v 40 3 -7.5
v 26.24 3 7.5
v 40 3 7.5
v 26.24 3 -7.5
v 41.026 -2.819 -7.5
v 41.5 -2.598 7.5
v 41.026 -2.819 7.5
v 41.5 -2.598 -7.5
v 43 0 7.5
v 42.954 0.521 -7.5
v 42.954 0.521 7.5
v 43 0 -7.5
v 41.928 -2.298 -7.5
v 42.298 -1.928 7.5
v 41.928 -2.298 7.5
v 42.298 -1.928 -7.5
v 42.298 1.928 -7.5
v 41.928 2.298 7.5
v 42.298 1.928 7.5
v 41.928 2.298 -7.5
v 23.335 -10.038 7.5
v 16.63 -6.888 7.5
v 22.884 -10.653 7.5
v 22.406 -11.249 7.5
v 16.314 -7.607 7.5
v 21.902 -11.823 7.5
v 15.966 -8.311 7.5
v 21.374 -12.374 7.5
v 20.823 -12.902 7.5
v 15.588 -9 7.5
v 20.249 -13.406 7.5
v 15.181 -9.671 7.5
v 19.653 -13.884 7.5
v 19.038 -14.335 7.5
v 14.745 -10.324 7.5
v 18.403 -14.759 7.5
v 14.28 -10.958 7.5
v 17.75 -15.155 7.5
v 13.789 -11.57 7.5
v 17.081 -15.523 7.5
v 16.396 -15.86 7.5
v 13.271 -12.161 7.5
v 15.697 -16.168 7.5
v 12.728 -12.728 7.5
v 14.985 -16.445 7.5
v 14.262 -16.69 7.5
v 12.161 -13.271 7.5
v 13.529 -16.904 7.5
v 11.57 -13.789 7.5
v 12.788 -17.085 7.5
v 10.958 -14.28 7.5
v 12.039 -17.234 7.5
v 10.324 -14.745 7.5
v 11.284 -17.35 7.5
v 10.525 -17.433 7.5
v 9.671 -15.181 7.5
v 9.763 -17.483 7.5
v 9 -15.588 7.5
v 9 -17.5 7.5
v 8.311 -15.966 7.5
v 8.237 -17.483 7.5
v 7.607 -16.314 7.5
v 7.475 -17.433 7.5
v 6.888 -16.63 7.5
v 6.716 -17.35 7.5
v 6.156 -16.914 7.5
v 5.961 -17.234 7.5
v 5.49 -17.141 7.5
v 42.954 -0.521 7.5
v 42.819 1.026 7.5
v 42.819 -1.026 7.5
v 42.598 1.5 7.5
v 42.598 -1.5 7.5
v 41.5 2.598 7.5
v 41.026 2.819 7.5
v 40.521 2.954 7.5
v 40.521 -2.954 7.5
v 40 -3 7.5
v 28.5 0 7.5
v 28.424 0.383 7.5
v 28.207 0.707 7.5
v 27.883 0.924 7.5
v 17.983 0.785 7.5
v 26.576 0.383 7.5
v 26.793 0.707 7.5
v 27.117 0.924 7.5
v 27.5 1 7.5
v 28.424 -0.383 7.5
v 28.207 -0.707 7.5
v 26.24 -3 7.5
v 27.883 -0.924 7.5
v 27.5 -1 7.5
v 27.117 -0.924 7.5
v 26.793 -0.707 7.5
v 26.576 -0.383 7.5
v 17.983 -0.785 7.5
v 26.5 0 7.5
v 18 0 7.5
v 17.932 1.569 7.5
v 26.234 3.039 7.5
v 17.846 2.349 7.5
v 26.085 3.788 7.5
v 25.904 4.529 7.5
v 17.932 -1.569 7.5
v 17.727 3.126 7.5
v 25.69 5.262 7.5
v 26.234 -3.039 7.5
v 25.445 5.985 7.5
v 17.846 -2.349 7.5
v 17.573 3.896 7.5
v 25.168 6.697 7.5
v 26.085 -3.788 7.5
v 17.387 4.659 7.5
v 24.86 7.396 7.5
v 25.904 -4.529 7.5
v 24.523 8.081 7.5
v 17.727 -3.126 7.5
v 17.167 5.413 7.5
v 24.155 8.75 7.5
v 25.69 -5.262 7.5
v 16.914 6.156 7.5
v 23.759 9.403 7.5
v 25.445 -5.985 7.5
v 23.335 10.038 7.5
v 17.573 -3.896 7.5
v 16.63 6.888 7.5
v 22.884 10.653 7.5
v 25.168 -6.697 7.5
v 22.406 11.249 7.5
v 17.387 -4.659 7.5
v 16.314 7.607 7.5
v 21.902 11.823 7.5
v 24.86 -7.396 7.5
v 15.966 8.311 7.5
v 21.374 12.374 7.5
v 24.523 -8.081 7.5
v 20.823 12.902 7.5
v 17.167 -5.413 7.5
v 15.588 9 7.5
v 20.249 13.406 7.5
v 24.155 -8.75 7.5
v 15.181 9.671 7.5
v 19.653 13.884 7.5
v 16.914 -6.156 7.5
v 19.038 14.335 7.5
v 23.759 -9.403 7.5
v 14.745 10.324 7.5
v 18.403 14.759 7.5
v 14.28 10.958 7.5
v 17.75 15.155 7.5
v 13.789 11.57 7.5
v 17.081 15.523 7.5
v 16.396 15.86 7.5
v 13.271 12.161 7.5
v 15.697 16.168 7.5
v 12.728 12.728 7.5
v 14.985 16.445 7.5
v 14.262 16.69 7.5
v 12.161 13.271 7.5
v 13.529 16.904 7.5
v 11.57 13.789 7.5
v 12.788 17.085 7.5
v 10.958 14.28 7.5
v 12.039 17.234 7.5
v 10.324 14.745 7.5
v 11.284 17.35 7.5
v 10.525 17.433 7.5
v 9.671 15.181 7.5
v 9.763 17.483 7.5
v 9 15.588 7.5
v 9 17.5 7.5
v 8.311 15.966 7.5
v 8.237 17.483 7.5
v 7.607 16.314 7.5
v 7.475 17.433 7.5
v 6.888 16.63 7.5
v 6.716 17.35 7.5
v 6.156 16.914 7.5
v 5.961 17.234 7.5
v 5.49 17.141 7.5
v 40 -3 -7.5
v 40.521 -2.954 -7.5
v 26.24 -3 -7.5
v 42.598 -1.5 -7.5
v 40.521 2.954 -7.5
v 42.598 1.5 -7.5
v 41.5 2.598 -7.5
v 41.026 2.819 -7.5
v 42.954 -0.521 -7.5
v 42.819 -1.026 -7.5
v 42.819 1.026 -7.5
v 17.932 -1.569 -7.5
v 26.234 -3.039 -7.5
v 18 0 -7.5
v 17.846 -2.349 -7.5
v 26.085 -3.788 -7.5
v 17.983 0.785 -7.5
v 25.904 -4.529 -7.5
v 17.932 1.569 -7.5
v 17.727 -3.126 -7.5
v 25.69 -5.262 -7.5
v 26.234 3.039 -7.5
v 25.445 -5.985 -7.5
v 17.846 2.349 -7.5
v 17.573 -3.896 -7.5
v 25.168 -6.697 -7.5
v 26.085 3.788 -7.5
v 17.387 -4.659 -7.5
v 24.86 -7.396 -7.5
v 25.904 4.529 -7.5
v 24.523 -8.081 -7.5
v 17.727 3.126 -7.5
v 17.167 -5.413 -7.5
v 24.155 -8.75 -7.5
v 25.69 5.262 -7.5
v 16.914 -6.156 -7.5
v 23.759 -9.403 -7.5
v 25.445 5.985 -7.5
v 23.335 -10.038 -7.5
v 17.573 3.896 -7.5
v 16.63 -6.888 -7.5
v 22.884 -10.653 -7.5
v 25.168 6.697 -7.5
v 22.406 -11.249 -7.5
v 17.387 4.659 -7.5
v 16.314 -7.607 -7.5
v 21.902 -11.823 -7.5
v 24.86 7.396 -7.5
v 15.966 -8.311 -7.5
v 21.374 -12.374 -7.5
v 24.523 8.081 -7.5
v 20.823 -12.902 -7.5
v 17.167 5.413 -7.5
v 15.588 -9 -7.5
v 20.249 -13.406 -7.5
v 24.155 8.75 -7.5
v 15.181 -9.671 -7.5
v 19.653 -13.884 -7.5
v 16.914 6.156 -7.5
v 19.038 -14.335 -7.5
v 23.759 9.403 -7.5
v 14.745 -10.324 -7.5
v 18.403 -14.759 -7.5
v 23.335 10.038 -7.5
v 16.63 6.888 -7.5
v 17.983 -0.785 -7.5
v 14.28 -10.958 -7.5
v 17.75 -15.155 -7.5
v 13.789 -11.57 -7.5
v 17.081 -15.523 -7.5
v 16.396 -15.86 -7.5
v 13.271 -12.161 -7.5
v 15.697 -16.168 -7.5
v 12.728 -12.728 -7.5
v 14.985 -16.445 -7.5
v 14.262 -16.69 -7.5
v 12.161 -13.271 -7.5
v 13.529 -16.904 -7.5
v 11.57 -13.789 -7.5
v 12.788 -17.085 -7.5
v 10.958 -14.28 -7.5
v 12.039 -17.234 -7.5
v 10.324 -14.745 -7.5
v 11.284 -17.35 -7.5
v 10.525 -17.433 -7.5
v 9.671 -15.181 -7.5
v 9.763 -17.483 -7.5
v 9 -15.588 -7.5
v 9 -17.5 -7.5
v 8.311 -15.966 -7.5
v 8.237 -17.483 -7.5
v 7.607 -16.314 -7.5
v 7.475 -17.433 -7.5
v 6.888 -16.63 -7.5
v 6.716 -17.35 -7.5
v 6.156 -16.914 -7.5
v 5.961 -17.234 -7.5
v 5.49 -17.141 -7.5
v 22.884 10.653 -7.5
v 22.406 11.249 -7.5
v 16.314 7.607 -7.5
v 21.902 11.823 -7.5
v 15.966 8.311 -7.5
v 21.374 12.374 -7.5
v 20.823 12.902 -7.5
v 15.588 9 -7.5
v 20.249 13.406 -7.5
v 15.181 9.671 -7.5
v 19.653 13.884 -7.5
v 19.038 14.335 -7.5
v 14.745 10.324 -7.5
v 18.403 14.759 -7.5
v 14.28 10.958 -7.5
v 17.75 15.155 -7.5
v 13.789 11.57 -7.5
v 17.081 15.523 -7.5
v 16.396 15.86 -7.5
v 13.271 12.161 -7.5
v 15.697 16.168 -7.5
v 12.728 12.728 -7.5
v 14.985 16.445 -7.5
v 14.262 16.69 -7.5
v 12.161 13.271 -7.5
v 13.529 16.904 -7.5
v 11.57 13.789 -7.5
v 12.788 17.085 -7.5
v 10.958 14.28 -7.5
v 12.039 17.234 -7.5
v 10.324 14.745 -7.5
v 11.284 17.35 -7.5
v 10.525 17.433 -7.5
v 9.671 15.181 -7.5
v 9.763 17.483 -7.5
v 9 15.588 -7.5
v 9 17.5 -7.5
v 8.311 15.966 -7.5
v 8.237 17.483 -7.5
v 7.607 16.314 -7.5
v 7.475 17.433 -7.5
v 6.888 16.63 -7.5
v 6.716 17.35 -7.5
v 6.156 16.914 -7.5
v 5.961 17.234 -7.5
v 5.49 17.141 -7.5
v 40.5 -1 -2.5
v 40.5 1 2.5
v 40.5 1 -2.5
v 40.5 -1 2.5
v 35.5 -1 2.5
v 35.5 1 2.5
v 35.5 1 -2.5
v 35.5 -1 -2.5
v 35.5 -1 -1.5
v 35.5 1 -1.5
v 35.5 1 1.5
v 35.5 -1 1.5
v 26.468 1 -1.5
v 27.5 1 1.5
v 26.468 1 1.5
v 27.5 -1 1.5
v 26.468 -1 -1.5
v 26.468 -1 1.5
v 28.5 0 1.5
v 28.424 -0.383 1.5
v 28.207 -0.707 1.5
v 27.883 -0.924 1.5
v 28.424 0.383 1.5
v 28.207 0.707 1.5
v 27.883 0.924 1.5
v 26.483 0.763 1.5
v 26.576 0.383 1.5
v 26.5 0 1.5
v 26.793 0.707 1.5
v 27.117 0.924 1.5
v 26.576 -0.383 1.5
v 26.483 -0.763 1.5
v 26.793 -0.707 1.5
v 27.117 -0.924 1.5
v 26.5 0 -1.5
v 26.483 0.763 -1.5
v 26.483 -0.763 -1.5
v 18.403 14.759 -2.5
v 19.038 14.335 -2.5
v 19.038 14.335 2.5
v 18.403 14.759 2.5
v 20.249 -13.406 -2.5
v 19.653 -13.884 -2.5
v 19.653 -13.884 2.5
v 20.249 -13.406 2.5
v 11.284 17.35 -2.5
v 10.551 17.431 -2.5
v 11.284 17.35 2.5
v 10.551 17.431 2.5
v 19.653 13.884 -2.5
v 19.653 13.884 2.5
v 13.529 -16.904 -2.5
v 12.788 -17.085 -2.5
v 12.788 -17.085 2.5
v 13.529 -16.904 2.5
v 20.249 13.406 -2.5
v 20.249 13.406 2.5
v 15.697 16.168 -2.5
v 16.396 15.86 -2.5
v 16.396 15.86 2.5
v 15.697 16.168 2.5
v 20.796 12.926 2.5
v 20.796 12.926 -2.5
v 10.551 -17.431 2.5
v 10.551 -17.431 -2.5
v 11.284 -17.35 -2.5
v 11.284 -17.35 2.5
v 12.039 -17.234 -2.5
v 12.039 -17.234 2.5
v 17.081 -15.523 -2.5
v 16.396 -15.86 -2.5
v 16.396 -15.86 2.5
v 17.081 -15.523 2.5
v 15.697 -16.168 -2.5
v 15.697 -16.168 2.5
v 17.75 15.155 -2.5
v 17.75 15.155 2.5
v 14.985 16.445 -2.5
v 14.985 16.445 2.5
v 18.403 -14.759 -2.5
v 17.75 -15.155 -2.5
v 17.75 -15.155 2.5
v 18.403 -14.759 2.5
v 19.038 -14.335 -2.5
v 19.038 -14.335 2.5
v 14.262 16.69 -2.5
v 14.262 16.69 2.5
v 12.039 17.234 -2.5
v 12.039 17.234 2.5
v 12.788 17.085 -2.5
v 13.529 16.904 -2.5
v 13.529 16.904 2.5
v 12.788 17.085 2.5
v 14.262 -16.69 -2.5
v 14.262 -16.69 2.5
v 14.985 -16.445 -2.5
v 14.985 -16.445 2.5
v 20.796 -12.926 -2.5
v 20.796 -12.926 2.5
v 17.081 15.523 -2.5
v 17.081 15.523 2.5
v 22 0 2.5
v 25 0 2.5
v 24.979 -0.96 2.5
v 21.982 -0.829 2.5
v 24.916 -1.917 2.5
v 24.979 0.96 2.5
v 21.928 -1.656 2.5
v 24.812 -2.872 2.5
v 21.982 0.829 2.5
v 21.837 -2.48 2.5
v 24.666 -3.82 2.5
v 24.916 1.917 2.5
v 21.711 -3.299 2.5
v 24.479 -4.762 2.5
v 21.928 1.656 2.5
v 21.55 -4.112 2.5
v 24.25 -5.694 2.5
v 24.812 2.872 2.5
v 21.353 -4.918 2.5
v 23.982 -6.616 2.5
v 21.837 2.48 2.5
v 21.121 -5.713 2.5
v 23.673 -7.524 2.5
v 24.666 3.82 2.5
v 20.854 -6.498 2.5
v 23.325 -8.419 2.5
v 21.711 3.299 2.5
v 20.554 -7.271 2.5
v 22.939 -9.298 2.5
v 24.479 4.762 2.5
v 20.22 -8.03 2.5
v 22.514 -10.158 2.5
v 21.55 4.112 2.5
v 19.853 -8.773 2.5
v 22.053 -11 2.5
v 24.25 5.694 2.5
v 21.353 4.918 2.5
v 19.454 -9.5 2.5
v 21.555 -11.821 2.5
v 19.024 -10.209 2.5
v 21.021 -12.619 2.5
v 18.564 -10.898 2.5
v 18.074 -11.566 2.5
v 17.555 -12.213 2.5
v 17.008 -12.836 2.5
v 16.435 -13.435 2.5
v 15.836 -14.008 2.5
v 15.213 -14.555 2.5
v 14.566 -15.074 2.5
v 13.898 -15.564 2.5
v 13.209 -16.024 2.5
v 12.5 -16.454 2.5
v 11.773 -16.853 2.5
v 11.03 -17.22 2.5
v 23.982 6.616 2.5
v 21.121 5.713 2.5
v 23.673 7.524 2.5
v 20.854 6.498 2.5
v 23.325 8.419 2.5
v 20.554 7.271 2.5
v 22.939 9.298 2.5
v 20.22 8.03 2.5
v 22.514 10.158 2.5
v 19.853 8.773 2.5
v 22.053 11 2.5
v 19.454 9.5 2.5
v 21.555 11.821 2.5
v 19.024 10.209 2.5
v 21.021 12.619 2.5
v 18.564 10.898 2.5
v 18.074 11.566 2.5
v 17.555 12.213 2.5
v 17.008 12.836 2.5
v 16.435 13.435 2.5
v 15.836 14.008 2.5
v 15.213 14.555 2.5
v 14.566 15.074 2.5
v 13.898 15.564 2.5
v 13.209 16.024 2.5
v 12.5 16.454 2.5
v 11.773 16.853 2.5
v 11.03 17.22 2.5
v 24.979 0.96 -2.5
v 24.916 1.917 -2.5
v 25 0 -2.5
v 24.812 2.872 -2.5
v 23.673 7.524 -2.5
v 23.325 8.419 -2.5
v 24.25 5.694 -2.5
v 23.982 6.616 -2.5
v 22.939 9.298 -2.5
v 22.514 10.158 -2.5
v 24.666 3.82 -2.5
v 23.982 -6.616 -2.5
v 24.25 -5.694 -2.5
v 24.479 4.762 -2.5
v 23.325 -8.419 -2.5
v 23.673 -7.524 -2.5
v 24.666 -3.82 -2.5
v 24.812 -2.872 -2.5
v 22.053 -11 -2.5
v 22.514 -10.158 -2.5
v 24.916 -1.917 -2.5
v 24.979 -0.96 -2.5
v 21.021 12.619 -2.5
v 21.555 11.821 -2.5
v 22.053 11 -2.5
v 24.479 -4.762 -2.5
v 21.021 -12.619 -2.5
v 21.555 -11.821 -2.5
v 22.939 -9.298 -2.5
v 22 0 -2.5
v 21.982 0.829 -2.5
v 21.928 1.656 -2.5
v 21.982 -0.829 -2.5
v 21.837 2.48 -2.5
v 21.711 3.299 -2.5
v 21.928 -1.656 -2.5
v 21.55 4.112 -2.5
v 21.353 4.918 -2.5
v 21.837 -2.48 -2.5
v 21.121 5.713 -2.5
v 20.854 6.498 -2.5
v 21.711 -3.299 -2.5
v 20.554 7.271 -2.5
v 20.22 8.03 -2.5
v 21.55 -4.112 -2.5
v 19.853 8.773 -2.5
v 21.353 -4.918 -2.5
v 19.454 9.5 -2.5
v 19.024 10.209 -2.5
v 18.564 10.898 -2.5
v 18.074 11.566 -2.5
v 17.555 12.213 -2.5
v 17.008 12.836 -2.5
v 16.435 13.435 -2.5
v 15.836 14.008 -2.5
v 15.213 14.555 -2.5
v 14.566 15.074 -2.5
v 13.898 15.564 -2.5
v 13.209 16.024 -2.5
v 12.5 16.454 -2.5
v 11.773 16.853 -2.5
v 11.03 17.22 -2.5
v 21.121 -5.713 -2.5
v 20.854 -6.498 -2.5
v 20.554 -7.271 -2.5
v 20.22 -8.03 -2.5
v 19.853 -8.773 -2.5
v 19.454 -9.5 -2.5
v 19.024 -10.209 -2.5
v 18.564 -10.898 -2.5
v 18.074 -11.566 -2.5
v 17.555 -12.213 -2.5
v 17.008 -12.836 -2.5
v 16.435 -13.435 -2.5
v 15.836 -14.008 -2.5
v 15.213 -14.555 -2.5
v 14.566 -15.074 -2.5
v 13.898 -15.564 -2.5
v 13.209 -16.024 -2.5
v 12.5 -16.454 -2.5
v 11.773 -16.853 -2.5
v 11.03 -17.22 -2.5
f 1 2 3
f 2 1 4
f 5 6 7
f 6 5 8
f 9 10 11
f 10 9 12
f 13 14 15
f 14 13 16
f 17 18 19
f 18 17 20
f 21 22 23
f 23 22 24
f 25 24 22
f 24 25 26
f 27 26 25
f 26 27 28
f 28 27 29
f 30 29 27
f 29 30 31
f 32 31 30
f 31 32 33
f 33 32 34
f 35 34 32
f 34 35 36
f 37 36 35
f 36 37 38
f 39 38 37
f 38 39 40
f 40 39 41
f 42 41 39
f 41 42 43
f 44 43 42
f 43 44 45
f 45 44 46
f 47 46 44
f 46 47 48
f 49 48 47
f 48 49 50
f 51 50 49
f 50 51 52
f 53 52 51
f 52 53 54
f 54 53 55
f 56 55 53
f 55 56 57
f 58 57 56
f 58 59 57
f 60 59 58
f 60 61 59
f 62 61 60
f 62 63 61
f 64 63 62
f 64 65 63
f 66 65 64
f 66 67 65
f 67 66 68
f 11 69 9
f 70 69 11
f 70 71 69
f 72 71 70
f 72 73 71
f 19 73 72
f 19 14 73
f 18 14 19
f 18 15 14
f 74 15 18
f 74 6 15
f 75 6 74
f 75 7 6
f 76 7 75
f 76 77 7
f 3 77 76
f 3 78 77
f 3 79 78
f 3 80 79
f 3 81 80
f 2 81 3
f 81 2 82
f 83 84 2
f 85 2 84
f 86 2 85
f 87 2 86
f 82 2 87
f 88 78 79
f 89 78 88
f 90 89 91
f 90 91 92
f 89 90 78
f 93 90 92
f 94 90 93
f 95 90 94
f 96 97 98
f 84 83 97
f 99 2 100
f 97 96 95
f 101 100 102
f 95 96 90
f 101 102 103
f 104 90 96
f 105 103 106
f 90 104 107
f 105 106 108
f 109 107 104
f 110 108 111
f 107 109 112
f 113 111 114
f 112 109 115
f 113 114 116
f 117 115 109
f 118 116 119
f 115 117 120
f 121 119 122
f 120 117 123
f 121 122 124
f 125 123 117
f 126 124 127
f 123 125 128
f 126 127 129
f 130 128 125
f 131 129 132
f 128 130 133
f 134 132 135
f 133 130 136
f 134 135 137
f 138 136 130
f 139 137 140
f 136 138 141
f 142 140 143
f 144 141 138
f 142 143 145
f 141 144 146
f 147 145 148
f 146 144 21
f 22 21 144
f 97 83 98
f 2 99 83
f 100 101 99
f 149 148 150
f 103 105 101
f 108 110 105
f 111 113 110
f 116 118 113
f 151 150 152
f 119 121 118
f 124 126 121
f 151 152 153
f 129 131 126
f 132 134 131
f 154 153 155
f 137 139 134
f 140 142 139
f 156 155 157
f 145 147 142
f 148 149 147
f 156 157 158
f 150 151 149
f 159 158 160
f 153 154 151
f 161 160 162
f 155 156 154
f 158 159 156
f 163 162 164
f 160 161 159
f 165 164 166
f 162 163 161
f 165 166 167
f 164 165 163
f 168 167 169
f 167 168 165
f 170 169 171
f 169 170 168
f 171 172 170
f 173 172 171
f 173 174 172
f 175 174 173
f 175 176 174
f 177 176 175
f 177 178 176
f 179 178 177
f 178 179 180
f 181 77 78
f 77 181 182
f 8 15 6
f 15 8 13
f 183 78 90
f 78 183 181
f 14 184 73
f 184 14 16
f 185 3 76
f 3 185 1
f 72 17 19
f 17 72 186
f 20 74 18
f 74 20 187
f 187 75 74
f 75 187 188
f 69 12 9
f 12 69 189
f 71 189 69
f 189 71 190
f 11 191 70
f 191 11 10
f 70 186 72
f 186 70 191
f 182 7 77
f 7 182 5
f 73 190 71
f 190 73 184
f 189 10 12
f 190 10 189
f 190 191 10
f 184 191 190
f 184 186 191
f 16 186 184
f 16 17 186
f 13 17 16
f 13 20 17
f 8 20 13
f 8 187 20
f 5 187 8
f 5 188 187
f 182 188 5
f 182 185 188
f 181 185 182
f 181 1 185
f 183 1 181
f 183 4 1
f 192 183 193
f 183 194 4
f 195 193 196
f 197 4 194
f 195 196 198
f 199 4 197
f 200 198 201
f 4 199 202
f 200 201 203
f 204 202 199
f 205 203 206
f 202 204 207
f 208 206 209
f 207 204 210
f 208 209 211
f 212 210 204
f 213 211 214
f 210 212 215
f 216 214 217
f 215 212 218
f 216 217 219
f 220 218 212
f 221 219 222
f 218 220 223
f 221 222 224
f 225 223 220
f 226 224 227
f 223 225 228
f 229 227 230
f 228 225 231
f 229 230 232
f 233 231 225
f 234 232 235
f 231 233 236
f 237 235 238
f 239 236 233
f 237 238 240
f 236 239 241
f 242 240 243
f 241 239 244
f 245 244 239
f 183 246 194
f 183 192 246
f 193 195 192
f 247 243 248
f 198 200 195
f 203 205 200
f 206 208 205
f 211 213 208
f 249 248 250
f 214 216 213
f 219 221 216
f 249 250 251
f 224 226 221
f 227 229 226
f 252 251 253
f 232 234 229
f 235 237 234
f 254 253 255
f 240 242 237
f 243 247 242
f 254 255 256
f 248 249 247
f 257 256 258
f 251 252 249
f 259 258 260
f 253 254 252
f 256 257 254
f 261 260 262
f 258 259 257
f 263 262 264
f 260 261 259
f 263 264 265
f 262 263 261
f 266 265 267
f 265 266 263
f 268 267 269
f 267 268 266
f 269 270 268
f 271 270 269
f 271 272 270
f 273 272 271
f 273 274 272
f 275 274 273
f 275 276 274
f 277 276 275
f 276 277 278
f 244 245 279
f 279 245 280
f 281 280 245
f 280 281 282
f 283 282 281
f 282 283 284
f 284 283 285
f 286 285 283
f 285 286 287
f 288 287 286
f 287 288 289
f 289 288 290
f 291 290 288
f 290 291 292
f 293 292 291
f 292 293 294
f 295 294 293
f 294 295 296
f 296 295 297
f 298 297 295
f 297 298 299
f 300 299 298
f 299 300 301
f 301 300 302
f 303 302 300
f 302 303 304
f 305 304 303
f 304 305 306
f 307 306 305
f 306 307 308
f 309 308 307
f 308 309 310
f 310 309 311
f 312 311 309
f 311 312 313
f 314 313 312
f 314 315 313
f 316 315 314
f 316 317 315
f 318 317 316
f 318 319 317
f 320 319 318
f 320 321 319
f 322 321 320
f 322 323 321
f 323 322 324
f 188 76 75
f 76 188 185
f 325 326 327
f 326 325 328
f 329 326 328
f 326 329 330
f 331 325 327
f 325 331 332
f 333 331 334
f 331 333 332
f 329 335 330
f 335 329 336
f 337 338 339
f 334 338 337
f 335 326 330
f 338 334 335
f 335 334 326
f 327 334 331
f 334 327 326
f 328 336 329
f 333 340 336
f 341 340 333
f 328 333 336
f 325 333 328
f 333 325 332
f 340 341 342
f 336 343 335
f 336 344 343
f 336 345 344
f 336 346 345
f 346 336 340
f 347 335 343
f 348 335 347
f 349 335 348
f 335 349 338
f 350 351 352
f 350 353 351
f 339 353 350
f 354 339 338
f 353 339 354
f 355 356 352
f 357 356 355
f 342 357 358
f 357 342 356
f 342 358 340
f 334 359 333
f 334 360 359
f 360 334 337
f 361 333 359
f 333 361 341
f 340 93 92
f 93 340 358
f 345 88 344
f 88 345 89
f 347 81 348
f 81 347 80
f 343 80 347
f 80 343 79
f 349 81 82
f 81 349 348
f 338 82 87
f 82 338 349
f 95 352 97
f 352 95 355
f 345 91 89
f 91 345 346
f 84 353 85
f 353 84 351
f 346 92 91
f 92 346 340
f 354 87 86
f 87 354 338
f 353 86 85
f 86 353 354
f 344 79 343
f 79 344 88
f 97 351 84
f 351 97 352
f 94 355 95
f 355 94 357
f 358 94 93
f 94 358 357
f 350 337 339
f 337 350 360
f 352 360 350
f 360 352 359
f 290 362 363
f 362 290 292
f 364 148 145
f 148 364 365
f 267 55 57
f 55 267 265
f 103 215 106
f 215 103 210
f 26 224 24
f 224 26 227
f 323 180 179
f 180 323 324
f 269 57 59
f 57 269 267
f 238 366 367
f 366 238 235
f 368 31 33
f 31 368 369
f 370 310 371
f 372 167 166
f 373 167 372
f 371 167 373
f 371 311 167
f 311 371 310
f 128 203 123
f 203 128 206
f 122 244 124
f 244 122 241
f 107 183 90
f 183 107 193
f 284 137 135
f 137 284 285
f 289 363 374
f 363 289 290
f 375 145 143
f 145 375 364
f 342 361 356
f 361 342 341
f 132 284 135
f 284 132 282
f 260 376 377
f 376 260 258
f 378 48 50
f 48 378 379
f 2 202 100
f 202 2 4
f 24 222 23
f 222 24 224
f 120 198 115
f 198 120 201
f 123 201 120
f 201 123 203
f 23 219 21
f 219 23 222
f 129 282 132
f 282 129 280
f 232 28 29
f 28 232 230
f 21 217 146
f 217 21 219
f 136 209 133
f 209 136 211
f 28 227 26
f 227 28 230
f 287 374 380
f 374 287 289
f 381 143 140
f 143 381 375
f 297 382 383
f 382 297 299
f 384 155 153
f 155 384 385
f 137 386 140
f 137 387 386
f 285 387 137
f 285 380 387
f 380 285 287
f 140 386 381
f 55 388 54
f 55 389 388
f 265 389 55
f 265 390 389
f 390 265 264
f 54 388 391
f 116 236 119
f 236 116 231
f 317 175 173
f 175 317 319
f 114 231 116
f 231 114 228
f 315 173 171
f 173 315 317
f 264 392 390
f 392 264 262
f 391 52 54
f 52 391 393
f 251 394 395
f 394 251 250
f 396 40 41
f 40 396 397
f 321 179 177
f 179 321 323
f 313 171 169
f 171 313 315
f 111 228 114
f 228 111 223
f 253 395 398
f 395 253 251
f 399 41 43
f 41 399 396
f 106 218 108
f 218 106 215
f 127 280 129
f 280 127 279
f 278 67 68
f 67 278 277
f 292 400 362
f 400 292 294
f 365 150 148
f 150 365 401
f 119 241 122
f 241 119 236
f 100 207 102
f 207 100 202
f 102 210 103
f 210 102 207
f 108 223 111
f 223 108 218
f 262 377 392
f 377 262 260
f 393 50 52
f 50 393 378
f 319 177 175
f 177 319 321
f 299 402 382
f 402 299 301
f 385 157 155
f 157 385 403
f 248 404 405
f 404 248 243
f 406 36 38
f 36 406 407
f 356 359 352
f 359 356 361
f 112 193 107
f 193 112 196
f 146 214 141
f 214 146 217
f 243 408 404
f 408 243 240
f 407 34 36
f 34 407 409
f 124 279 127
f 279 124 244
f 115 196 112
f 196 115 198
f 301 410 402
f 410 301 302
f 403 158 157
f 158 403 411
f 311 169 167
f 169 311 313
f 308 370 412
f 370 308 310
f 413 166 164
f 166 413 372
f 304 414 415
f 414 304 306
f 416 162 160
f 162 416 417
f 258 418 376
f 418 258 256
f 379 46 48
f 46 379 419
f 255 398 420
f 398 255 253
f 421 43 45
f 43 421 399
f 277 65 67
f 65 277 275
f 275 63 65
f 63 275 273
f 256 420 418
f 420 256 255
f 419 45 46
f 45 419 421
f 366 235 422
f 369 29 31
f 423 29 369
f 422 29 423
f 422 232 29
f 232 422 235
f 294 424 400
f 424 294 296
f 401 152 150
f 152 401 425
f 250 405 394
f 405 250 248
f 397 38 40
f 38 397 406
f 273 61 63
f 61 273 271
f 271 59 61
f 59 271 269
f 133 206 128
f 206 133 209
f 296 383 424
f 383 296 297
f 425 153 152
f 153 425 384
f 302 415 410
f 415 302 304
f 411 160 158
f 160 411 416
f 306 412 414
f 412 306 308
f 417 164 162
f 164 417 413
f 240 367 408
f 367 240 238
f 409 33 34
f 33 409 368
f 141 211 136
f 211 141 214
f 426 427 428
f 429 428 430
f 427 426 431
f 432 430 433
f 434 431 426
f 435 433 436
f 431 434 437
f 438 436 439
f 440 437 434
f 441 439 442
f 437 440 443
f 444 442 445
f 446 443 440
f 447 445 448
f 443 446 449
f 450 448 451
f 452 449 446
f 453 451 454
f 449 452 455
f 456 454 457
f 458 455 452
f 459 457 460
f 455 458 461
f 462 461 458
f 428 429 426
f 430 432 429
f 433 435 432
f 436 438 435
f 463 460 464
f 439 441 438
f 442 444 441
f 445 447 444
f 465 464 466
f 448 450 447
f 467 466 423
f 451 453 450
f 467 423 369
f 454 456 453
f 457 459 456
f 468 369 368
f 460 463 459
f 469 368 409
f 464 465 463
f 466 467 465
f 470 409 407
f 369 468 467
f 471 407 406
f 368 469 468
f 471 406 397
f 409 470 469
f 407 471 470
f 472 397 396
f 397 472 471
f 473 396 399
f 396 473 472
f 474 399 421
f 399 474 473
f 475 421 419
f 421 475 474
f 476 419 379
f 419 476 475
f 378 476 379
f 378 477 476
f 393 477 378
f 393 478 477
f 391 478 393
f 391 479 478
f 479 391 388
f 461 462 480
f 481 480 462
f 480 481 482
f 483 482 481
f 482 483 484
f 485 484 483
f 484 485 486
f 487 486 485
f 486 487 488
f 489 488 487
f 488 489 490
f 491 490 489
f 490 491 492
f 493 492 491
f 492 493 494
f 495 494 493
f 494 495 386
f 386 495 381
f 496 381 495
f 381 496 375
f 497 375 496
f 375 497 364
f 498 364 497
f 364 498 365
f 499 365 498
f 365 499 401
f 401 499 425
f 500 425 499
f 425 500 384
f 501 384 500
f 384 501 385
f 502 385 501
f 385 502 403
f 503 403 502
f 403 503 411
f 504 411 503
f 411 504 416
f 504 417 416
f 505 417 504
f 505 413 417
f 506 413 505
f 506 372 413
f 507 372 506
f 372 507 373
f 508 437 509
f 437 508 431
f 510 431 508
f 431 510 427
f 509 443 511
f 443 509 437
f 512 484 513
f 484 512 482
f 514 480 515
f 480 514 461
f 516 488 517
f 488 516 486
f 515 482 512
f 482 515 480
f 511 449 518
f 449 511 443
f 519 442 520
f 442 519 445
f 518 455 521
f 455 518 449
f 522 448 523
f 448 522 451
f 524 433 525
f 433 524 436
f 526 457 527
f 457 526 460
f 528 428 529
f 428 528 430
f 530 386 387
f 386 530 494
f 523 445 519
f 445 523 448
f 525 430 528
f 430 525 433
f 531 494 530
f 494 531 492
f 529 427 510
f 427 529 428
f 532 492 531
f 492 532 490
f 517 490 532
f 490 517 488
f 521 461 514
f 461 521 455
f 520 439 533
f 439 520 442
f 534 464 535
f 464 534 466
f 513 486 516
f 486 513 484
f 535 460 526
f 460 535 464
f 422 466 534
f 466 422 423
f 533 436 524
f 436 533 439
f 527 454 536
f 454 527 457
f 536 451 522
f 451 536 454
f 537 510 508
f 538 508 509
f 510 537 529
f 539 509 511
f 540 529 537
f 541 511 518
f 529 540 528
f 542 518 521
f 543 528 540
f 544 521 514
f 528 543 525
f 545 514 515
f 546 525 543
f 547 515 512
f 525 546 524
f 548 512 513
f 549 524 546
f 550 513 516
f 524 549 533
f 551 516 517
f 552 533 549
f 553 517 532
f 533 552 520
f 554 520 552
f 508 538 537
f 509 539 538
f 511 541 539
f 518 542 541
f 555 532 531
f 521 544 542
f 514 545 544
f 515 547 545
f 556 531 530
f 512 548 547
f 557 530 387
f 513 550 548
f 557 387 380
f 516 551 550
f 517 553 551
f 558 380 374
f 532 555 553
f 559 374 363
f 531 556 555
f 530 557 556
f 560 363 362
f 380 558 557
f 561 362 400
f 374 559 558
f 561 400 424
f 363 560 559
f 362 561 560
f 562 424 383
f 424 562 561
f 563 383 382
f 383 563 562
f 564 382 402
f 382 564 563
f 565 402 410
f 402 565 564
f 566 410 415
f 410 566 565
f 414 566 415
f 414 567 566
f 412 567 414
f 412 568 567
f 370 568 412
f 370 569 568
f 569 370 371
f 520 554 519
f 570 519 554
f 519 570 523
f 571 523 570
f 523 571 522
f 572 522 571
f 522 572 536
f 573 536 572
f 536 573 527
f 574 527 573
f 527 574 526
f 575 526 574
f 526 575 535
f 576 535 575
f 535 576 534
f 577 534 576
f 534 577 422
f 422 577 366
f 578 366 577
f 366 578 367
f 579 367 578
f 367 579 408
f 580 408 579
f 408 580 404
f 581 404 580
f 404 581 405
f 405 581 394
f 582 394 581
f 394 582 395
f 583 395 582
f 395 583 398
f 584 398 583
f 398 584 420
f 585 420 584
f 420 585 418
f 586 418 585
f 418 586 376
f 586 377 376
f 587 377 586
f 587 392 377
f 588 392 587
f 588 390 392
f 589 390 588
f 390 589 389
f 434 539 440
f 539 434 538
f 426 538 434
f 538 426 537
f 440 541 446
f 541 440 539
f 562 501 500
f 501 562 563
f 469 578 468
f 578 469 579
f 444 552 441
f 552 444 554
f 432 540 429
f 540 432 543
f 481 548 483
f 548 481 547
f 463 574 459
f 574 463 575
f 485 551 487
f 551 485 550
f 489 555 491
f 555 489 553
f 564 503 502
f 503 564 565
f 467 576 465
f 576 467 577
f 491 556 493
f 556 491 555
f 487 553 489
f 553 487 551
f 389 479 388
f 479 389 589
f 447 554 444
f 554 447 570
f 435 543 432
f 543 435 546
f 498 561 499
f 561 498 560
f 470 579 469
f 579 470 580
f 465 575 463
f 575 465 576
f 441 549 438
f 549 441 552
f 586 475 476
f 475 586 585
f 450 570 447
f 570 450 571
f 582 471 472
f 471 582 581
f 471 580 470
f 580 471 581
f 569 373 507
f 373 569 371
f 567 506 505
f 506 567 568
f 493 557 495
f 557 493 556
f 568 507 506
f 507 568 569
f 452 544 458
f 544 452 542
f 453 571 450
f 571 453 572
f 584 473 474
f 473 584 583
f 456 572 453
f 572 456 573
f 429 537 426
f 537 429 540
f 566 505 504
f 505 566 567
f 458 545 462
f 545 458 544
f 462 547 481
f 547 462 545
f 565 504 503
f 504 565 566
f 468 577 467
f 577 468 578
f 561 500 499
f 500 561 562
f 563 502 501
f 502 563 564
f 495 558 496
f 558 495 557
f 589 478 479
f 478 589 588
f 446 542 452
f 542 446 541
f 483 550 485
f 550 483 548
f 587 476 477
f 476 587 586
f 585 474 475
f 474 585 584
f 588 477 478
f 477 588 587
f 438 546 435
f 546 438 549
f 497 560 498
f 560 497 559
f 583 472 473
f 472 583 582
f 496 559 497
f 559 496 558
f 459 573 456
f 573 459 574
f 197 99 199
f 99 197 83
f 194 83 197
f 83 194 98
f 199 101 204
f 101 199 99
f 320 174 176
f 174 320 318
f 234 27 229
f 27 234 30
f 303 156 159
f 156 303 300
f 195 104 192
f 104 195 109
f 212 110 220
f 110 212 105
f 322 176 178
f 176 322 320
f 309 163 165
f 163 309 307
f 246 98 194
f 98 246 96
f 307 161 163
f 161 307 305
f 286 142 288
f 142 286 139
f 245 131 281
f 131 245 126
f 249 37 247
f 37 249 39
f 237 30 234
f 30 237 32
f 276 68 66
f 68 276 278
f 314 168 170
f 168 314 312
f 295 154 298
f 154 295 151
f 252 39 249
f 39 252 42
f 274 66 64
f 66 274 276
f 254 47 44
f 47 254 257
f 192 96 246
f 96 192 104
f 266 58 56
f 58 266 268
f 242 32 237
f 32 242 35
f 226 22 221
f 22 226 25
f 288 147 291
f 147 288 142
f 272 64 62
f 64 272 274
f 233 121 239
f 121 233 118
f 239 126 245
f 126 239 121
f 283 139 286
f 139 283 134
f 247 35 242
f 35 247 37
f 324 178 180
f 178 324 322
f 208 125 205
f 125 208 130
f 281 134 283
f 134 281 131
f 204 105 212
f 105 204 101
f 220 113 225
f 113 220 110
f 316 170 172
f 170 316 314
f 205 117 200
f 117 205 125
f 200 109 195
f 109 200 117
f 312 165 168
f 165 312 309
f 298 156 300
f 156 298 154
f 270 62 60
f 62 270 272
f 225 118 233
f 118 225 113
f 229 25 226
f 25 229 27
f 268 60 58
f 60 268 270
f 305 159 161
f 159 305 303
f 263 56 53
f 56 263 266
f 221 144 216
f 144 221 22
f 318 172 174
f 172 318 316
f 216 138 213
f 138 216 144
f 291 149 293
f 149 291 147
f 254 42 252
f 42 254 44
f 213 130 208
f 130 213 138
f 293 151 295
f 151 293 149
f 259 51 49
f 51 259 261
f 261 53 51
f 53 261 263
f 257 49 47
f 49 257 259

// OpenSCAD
module velotube() {
    cylinder(d=36, h=100, $fn=36*4, center=true);
}

module diffcube() {
    translate([46.3,20,0])
        cube([40,40,40], center=true);
}

module sensorcase() {
    difference() {
        hull() {
            translate([40,0,0])
                cylinder(d=6, h=15, $fn=36, center=true);
            translate([26,0,0])
                cylinder(d=6, h=15, $fn=36, center=true);
        }
/*        
        translate([33,0,6])
            rotate([90,0,0])
                cylinder(d=3.5, h=20, $fn=36, center=true);

        translate([33,0,-6])
            rotate([90,0,0])
                cylinder(d=3.5, h=20, $fn=36, center=true);
  */      
        translate([38,0,0])
            cube([5,2,5], center=true);

        translate([33,0,0])
            cube([14,2,3], center=true);
        
        translate([27.5,0,0])
            cylinder(d=2, h=10.01, $fn=16);
    }
}

module sensormount() {
    difference() {
        union() {
            translate([9,0,0])
                cylinder(d=35, h=15, $fn=36*4, center=true);
            sensorcase();
        }
        velotube();
        cylinder(d=36, h=100, $fn=36, center=true);
        
        translate([3,0,0])    
            difference() {
                cylinder(d=44, h=5, $fn=36*4, center=true);
                cylinder(d=38, h=5.01, $fn=36*4, center=true);
            }
        //diffcube();
    }

}

module sensorhood() {
    intersection() {
        sensorcase();
        diffcube();
    }
}

//velotube();
//translate([0,0,20])
//    cube([100,40,40], center=true);

difference() {
    sensormount();
    translate([0,0,20])
        cube([100,40,40], center=true);
}

intersection() {
    sensormount();
    translate([0,0,20])
        cube([100,40,40], center=true);
}

//translate([0,10,0])
//    sensorhood();
